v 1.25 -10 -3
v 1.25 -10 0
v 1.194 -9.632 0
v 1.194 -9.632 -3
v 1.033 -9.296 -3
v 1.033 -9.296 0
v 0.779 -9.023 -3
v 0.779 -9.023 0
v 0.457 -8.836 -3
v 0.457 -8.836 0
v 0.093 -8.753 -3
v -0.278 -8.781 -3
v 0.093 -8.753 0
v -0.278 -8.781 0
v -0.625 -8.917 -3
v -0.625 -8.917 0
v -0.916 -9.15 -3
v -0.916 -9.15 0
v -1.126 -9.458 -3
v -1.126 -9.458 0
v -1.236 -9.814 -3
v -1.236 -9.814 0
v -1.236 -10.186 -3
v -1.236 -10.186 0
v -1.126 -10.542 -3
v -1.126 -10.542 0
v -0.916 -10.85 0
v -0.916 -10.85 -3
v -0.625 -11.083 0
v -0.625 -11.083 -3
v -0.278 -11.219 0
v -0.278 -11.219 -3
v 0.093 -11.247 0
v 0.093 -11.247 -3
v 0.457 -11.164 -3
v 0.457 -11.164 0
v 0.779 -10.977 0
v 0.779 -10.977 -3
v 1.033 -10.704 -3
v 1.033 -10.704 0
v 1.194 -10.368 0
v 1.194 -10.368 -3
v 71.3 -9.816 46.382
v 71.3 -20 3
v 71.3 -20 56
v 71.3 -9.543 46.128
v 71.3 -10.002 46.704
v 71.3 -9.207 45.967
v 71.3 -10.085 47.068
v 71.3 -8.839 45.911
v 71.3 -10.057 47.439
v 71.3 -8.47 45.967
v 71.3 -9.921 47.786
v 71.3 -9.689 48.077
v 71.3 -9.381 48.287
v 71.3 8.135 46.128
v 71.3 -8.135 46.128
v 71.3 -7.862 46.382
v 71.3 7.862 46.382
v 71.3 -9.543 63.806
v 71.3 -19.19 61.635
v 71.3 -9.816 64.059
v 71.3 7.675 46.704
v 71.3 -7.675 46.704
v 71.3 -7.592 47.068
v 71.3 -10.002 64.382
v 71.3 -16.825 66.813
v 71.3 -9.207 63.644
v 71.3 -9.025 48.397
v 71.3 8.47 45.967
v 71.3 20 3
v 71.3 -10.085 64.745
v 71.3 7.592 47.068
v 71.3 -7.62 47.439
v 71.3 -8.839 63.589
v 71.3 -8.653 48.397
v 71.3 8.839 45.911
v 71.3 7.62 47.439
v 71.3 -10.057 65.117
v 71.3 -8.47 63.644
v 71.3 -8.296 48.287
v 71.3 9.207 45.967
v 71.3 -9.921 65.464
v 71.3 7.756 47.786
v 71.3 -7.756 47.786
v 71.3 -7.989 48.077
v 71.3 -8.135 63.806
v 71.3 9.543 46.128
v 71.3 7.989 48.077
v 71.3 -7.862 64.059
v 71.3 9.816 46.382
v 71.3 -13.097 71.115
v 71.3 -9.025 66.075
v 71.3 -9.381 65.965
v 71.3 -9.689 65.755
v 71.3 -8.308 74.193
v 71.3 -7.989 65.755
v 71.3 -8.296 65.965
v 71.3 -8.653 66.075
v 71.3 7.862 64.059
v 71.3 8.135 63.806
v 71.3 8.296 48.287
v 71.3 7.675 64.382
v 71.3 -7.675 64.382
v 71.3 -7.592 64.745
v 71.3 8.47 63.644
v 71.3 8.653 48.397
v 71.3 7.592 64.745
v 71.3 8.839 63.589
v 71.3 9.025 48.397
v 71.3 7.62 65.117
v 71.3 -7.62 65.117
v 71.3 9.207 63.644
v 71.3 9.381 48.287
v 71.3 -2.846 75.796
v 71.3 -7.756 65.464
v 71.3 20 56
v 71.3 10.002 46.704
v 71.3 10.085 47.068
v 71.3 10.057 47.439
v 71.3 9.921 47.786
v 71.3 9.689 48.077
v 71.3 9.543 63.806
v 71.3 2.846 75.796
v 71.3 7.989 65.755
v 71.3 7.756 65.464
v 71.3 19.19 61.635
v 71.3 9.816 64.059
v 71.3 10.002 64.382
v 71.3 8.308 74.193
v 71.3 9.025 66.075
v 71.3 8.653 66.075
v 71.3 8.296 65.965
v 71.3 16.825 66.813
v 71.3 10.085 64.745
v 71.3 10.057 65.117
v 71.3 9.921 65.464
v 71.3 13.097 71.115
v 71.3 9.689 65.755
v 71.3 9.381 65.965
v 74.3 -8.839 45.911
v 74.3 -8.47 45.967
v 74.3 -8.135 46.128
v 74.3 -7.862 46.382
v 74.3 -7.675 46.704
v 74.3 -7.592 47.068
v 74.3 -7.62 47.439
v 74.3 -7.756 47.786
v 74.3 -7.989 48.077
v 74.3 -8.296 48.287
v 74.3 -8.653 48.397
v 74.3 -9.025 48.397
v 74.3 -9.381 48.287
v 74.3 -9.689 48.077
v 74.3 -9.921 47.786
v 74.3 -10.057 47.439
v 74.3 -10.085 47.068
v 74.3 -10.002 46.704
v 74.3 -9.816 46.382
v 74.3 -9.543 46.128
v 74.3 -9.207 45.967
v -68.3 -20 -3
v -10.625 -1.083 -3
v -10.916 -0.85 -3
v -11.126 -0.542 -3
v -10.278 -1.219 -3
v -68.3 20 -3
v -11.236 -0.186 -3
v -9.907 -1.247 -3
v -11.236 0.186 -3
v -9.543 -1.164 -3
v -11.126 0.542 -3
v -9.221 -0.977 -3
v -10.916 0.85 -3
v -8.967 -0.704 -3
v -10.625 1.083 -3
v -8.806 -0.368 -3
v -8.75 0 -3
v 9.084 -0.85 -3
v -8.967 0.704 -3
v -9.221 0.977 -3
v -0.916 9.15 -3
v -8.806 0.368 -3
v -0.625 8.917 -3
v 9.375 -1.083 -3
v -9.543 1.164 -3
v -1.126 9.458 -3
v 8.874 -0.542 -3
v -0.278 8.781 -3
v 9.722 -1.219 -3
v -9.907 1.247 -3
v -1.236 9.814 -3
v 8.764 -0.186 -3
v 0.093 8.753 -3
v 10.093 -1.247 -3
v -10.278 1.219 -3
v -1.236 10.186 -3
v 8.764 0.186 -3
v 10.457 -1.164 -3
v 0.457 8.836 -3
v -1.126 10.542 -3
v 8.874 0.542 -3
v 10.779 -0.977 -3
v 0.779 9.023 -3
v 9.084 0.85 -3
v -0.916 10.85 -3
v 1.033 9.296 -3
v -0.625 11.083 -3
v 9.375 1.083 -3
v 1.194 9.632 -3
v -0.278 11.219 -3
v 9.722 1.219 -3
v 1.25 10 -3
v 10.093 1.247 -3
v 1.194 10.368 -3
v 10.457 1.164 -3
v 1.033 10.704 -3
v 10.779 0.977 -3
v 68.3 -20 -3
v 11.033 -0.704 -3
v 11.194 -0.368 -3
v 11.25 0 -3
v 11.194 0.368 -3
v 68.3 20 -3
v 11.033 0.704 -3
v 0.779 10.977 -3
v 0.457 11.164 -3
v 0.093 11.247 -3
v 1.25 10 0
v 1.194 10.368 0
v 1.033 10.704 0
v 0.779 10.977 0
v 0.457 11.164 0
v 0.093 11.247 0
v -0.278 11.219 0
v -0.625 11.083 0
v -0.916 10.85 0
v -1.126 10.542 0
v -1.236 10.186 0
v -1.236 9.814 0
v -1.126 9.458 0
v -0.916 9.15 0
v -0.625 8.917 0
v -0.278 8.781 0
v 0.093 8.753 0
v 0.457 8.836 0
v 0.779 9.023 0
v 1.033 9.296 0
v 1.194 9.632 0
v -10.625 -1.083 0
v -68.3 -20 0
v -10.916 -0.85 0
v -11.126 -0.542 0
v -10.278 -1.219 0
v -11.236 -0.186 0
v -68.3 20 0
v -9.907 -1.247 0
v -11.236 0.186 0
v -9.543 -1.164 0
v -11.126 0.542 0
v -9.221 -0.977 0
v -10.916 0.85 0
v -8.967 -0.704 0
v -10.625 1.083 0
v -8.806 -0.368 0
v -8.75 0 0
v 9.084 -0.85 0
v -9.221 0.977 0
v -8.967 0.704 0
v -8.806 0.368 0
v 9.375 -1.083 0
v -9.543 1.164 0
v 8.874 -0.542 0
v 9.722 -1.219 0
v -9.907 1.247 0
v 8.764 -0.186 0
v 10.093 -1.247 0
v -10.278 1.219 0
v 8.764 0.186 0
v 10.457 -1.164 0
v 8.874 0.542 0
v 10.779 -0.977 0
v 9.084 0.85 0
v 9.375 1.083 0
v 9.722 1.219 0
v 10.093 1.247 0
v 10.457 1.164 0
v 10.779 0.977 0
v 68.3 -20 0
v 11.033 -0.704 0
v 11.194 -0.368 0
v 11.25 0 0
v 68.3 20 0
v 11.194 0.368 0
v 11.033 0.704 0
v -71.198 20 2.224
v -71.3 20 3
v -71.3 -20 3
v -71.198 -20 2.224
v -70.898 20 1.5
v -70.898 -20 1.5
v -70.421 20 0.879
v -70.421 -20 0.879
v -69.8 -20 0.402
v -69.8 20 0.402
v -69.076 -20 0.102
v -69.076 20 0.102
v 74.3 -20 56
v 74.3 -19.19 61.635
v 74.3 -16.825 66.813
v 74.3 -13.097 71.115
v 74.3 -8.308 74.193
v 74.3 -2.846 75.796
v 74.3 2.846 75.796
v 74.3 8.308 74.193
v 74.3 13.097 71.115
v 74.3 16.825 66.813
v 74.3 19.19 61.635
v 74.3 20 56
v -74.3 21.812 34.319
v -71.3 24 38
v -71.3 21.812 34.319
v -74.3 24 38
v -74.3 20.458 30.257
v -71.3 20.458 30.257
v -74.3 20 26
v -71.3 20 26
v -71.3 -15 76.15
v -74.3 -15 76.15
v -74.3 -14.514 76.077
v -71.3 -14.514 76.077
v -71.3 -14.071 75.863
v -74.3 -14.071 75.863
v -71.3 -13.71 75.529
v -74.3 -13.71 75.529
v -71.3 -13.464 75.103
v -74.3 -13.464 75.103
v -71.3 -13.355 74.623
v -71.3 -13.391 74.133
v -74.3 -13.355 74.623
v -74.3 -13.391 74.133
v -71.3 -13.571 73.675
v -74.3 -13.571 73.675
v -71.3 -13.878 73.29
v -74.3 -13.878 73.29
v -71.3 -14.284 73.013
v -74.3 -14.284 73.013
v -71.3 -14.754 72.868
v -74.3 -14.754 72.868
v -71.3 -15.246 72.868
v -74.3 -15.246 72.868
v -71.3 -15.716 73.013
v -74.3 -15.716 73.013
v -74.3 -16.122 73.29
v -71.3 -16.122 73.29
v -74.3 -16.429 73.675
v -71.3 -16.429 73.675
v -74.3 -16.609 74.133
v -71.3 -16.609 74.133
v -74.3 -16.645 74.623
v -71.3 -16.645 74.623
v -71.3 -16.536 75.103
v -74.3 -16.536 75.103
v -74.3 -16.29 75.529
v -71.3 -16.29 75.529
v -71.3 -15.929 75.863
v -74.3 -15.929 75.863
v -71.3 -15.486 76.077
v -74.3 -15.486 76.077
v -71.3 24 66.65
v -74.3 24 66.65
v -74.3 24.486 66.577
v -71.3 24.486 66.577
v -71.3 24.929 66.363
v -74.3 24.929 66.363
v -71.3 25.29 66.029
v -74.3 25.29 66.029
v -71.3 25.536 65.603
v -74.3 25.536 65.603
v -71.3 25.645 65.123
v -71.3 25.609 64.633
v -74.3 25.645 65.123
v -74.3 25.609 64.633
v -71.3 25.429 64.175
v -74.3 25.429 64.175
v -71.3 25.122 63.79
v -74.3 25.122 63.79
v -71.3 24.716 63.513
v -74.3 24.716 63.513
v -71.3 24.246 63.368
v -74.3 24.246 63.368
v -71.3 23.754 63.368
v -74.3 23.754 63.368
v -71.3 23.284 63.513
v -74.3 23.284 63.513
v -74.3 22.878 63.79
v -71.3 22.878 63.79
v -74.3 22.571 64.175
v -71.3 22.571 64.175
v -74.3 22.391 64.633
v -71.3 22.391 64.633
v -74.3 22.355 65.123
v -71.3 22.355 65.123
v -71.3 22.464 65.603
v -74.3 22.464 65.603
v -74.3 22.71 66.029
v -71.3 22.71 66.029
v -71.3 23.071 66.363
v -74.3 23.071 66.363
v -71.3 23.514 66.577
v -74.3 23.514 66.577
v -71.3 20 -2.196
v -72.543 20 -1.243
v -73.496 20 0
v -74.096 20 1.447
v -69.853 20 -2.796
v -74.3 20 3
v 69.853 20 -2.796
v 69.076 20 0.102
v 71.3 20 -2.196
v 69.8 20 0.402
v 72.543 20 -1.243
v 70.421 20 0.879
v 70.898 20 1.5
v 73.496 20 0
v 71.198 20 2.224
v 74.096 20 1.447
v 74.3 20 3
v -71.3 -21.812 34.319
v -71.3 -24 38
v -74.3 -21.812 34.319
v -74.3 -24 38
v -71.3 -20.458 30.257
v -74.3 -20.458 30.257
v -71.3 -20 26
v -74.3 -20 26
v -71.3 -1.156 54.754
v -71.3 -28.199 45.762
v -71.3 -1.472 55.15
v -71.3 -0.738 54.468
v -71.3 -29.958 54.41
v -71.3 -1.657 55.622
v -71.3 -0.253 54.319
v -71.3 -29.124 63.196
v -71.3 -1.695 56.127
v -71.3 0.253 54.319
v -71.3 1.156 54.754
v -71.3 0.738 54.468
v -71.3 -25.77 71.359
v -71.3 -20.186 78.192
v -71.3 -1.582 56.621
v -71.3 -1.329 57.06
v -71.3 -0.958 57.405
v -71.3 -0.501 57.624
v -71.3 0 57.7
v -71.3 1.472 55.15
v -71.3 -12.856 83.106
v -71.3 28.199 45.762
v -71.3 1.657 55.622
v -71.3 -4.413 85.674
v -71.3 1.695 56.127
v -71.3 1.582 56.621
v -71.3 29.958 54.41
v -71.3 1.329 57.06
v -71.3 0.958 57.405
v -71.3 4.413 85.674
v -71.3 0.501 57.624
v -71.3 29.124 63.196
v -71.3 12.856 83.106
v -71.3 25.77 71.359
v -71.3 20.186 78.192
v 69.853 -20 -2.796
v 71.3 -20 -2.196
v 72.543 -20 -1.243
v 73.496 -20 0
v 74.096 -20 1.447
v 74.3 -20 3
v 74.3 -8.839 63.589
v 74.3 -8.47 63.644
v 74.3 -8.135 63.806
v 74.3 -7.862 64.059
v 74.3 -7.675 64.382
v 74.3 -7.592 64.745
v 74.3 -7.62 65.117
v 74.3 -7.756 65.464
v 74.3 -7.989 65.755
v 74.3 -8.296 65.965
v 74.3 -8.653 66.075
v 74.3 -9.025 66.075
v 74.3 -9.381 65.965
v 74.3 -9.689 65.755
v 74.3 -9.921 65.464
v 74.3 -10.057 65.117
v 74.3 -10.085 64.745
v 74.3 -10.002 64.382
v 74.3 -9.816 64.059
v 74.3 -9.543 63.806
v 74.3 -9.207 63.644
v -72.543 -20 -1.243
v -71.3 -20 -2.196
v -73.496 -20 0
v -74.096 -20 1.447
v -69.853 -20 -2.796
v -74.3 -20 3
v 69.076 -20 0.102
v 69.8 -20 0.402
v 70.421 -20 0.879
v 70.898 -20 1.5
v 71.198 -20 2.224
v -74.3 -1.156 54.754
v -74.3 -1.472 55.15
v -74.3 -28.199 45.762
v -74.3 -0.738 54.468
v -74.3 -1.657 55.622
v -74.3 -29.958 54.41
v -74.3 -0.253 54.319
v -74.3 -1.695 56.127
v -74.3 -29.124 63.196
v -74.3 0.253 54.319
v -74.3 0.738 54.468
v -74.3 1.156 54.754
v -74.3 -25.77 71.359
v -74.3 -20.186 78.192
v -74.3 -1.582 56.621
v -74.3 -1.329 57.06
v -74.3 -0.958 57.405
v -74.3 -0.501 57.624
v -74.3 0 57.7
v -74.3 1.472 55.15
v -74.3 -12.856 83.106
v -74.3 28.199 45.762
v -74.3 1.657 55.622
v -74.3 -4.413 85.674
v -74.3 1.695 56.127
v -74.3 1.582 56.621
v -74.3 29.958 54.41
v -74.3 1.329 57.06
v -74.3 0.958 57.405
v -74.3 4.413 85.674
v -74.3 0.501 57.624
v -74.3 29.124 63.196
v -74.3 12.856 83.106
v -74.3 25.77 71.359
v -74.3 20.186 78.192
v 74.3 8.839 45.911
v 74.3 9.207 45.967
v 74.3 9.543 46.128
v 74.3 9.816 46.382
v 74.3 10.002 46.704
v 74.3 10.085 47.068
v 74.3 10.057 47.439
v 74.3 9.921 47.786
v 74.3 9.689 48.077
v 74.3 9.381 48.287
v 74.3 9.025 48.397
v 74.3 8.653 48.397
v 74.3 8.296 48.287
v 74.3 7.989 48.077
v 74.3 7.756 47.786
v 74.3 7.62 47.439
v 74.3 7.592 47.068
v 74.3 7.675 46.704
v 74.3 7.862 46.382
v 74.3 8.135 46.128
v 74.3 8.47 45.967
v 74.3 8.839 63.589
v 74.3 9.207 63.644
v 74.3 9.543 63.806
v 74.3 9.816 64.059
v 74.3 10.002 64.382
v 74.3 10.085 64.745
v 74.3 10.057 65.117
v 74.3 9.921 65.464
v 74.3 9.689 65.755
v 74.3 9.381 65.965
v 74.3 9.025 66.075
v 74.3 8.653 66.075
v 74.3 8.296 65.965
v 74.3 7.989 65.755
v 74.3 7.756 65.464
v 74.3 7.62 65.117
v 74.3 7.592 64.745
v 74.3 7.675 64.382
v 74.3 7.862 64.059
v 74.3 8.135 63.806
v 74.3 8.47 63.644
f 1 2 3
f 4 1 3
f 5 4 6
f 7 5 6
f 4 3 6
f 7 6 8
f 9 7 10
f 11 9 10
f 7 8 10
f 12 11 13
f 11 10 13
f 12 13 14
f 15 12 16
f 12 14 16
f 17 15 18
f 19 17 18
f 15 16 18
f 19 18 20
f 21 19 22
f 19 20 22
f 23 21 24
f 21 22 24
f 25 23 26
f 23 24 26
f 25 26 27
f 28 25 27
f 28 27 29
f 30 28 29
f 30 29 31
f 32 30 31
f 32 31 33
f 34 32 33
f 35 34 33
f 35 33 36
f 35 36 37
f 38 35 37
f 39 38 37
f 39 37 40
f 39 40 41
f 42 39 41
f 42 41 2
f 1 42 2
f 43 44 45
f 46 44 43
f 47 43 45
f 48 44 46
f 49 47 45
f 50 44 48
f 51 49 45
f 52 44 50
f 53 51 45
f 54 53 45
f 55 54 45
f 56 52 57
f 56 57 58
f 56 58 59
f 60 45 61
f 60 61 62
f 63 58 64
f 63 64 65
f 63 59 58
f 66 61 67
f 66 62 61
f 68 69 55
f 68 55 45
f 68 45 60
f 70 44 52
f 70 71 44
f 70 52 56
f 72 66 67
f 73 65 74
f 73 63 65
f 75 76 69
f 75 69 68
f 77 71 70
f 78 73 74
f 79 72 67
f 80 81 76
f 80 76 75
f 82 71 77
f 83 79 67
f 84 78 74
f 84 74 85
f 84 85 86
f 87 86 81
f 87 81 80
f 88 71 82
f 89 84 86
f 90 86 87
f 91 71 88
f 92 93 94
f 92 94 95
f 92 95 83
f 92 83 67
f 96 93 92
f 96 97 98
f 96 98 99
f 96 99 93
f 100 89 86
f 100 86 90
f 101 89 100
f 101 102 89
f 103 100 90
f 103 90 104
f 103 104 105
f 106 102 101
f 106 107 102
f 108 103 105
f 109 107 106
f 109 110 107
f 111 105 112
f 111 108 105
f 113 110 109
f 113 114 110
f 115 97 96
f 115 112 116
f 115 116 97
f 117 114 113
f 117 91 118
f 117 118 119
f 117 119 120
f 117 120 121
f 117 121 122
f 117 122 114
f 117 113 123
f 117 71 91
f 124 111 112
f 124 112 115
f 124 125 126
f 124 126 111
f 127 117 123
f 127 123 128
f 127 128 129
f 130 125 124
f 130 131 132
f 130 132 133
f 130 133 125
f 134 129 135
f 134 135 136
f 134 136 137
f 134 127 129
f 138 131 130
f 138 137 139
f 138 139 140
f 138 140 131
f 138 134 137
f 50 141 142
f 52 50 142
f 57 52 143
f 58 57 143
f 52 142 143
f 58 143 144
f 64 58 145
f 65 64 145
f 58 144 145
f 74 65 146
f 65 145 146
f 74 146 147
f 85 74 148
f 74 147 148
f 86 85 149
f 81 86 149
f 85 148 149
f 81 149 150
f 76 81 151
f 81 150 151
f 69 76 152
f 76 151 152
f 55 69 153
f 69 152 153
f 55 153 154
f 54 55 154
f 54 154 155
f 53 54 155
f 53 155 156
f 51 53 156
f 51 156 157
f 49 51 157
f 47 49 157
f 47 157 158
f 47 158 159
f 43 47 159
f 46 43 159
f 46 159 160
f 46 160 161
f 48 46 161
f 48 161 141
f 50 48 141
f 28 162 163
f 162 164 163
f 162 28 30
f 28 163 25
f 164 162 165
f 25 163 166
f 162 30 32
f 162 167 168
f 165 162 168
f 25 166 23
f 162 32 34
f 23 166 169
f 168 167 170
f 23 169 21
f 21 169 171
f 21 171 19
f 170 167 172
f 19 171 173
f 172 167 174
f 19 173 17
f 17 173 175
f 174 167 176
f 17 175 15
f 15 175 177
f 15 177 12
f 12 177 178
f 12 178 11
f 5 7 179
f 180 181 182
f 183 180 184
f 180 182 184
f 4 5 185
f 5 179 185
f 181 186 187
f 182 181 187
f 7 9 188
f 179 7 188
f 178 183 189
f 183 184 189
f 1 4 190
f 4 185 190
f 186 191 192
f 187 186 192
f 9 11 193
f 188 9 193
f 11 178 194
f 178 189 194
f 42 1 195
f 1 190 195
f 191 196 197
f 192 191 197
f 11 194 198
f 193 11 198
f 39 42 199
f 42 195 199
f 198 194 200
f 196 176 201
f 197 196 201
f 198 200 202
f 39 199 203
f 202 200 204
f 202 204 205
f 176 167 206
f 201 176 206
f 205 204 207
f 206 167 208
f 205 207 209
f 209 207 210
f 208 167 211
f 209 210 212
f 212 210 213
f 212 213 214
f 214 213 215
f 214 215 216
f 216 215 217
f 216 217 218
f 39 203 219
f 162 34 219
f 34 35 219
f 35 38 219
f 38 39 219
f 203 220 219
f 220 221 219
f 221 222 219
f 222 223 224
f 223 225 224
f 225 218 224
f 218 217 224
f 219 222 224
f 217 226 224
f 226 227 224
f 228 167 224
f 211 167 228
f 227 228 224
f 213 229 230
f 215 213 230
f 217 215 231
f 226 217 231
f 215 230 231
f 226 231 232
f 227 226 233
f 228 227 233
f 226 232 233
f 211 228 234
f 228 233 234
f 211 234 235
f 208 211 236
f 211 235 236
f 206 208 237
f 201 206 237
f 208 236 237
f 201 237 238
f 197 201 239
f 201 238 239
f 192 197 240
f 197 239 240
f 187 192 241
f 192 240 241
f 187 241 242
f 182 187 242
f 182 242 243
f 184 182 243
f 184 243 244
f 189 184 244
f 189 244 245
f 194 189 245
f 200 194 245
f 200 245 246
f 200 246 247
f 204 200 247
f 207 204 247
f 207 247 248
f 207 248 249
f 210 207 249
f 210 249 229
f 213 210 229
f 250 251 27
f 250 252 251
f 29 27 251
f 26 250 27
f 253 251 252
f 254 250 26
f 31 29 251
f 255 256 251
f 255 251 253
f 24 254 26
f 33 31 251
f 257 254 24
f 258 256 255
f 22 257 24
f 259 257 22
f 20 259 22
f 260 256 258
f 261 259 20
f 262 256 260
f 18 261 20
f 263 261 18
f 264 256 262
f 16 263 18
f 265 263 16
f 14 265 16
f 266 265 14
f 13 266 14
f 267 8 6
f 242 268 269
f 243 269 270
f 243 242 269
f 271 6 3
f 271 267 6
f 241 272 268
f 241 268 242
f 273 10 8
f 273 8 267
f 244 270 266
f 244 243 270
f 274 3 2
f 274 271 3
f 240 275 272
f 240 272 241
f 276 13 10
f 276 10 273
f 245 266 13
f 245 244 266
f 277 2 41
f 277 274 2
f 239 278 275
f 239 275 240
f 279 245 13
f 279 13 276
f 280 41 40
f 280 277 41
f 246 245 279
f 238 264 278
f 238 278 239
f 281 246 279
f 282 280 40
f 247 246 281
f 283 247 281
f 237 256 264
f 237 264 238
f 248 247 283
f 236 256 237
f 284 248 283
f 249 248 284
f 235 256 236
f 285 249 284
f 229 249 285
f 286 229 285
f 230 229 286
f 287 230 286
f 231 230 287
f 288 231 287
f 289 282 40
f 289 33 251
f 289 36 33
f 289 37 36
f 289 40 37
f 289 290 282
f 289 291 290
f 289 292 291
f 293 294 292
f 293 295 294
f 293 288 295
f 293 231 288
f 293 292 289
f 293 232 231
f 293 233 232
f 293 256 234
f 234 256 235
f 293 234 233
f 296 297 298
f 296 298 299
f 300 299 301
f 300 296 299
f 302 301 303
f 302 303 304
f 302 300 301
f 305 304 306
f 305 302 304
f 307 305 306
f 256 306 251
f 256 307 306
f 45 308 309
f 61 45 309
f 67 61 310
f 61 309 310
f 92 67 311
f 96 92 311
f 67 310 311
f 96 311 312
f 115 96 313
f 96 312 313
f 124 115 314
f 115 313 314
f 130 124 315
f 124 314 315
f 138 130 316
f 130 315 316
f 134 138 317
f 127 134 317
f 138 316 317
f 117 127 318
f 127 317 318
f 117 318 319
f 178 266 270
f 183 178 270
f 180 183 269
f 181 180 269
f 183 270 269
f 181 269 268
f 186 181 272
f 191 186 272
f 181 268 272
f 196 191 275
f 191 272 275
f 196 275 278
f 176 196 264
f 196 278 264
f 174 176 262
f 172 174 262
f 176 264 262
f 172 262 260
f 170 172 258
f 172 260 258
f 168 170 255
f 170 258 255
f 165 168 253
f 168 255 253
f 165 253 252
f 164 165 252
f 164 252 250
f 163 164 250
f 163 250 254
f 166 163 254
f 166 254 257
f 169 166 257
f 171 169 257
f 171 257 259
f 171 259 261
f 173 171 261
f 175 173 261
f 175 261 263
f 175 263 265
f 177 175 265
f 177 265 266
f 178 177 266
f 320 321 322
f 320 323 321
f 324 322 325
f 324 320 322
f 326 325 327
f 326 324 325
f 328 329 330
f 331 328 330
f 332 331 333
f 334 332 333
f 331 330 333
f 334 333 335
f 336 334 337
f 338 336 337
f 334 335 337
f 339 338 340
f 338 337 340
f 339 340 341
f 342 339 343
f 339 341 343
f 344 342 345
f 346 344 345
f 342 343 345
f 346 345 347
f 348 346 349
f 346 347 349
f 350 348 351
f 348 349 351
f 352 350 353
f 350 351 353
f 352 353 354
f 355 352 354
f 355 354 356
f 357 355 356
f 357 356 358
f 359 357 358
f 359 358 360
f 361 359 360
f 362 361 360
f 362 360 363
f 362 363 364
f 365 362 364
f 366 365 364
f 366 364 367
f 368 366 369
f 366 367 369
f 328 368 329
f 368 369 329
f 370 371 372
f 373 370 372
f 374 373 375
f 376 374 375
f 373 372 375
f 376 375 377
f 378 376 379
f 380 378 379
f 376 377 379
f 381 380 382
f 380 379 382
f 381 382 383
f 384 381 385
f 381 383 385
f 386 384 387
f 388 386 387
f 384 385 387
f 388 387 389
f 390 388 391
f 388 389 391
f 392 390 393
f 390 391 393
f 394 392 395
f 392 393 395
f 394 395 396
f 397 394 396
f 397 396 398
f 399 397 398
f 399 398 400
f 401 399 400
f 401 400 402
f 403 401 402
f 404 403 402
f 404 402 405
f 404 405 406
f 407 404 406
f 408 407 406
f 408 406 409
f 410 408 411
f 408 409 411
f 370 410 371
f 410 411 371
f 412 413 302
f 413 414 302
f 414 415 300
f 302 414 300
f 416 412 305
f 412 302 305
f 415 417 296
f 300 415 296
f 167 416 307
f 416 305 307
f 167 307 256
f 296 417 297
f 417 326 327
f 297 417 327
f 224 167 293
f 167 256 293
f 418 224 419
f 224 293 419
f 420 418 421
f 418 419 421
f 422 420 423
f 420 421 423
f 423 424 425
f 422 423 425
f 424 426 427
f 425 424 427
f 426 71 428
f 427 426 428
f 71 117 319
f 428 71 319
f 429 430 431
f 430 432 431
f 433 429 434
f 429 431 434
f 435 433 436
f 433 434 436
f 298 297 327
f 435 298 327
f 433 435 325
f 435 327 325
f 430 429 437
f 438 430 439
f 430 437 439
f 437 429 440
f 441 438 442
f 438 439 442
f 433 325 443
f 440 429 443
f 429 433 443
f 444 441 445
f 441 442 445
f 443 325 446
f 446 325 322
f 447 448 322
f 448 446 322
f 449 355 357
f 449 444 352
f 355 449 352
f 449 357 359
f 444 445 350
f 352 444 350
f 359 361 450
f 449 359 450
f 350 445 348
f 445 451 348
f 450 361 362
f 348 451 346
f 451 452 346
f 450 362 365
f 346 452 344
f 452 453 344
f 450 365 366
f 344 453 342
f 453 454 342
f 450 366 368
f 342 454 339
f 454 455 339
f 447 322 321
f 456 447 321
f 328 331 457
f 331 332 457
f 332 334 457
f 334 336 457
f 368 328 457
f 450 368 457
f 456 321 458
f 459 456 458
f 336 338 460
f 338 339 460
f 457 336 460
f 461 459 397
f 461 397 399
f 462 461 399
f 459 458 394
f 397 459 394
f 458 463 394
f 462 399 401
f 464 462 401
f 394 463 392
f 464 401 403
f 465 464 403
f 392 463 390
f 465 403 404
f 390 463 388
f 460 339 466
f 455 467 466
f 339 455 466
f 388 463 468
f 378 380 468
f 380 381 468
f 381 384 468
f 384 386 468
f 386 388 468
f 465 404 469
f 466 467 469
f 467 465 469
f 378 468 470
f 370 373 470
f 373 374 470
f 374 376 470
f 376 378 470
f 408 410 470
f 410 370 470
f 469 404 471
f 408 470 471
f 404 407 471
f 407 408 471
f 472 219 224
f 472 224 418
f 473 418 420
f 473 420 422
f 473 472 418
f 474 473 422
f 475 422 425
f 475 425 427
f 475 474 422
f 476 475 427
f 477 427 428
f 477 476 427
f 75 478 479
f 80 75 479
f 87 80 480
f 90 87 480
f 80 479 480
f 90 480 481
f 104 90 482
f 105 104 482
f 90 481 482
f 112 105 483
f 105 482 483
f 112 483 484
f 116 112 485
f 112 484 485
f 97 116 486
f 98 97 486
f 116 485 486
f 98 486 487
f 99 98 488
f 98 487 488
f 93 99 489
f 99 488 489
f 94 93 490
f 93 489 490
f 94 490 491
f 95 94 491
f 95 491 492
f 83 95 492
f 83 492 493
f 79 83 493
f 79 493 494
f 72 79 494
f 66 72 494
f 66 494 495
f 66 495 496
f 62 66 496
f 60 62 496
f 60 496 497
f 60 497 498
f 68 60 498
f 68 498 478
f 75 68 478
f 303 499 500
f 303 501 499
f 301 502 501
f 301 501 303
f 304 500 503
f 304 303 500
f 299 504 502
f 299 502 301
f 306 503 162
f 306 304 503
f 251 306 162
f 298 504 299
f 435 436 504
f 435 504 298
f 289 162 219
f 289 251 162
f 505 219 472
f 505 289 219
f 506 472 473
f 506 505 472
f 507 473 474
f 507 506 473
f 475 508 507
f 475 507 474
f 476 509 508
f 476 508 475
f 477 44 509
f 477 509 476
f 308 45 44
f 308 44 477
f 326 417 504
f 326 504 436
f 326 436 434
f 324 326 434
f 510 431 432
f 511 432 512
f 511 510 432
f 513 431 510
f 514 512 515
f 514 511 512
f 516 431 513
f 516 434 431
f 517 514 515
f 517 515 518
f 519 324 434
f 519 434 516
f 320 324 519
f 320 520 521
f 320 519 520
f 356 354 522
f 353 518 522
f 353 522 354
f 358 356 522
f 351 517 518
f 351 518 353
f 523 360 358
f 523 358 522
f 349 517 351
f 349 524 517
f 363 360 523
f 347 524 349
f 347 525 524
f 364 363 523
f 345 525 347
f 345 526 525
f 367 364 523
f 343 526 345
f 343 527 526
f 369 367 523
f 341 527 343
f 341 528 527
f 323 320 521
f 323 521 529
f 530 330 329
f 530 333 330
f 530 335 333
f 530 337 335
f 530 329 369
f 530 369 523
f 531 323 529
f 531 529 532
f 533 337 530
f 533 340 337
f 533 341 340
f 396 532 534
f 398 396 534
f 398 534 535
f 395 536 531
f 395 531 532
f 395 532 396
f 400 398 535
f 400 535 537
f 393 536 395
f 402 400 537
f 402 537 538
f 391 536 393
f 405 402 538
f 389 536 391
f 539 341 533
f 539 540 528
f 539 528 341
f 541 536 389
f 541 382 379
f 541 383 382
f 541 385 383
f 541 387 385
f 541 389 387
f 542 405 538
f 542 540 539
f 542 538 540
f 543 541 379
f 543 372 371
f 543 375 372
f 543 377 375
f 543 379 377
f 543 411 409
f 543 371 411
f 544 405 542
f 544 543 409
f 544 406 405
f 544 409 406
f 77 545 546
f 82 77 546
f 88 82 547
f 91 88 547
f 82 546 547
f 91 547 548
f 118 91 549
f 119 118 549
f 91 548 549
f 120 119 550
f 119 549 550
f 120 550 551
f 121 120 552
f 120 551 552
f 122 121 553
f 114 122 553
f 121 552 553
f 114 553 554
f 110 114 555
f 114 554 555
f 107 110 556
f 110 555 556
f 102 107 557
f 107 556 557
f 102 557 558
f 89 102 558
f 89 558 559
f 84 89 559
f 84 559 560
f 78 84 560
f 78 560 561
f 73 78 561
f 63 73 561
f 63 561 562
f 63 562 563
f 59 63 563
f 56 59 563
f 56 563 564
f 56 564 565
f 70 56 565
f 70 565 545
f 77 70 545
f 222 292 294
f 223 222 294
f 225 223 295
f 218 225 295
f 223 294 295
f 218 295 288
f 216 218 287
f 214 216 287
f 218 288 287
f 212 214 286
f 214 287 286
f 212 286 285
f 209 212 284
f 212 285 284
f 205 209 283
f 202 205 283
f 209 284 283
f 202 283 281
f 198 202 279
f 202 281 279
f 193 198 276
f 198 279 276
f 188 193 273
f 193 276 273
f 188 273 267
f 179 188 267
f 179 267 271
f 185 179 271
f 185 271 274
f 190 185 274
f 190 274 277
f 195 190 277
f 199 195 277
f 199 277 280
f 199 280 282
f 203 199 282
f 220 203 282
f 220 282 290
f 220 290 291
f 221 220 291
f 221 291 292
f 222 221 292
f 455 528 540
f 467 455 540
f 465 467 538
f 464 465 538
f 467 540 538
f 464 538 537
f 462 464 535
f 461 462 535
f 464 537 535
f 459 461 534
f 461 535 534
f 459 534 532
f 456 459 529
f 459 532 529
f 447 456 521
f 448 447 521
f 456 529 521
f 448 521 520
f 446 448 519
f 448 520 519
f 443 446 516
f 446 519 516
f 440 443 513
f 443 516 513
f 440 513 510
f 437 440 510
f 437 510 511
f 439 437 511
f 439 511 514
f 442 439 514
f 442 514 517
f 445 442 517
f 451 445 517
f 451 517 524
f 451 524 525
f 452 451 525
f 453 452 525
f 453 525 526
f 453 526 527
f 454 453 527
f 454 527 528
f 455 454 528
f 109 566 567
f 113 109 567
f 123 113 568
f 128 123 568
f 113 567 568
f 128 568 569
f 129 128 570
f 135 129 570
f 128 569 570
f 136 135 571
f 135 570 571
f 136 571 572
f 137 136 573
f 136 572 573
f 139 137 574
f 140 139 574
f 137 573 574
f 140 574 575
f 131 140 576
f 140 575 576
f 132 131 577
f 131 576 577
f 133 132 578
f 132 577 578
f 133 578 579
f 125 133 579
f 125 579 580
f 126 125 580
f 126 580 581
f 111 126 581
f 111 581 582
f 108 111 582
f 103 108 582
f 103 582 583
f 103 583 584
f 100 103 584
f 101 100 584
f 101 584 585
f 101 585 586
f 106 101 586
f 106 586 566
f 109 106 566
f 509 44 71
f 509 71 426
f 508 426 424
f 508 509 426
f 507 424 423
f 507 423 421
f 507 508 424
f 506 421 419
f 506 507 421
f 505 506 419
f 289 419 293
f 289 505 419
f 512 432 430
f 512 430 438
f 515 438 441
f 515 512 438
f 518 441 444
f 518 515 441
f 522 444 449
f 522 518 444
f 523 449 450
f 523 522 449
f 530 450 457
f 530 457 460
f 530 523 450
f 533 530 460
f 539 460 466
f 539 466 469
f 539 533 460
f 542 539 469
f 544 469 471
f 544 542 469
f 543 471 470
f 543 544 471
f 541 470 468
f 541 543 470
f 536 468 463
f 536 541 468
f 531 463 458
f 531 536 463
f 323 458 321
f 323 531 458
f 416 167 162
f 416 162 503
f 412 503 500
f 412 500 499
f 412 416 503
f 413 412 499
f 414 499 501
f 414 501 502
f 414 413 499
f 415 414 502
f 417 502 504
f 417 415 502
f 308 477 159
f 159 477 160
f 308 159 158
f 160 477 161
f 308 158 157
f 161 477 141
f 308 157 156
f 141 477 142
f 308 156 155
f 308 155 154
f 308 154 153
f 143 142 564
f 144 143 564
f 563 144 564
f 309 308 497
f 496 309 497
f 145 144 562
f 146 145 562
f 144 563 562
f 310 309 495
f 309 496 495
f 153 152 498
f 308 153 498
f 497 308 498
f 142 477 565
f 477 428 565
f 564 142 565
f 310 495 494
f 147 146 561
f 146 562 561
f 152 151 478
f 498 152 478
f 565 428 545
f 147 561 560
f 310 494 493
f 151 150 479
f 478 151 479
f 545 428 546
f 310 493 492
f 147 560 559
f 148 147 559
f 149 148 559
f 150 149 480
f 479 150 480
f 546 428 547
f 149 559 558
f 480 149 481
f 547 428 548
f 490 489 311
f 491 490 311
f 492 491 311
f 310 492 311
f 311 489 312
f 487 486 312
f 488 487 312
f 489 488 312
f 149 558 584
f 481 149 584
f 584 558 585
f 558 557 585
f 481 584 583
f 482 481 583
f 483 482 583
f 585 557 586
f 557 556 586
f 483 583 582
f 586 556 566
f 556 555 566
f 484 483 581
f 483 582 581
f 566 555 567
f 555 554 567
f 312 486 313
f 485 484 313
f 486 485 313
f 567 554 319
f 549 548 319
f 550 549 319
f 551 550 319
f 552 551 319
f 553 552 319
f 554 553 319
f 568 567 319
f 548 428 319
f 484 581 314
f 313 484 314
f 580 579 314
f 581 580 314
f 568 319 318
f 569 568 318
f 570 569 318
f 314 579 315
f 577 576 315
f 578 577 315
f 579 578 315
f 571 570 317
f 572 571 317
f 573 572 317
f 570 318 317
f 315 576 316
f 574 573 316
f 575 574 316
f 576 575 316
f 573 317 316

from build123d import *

# Parameters (mm, degrees)
ESQUISSE1_W                           = 142.6
ESQUISSE1_H                           = 40
T_LE_DE_BASE_PLI_E1_DEPTH             = 3
T_LE_PLI_E_SUR_AR_TE1_STRIP_W         = 18
T_LE_PLI_E_SUR_AR_TE1_STRIP_H         = 3
T_LE_PLI_E_SUR_AR_TE1_STRIP_CUT_DEPTH = 40
T_LE_PLI_E_SUR_AR_TE1_DEPTH           = 40
T_LE_PLI_E_SUR_AR_TE2_STRIP_W         = 18
T_LE_PLI_E_SUR_AR_TE2_STRIP_H         = 3
T_LE_PLI_E_SUR_AR_TE2_STRIP_CUT_DEPTH = 40
T_LE_PLI_E_SUR_AR_TE2_DEPTH           = 40
ENL_V_MAT_EXTRU_1_REACH               = 97.166
ESQUISSE14_R                          = 1.25
PATTE1_DEPTH                          = 3
ENL_V_MAT_EXTRU_2_REACH               = 170.101
ESQUISSE19_R                          = 1.25
PATTE2_START                          = -3
PATTE2_DEPTH                          = 3
ENL_V_MAT_EXTRU_3_REACH               = 170.101
ESQUISSE24_R                          = 1.7
ESQUISSE25_R                          = 30
ESQUISSE25_R_2                        = 1.65
ESQUISSE25_R_3                        = 1.7
BOSS_EXTRU_1_DEPTH                    = 3
CONG_1_R                              = 20


# Sheet-metal steps are written as plain solids
with BuildPart() as part:
    # Esquisse1 → Tôle de base pliée1 (new body)
    with BuildSketch(Plane.XY):
        Rectangle(ESQUISSE1_W, ESQUISSE1_H)
    extrude(amount=-T_LE_DE_BASE_PLI_E1_DEPTH)

    # Tôle pliée sur arête1 strip (across the edge) → Tôle pliée sur arête1 strip cut (cut)
    with BuildSketch(Plane(origin=(-71.3, 20, 0), x_dir=(1, 0, 0), z_dir=(0, -1, 0))):
        with Locations((-6, -1.5)):
            Rectangle(T_LE_PLI_E_SUR_AR_TE1_STRIP_W, T_LE_PLI_E_SUR_AR_TE1_STRIP_H)
    extrude(amount=T_LE_PLI_E_SUR_AR_TE1_STRIP_CUT_DEPTH, mode=Mode.SUBTRACT)

    # Tôle pliée sur arête1 section (across the edge) → Tôle pliée sur arête1 (add)
    with BuildSketch(Plane(origin=(-71.3, 20, 0), x_dir=(1, 0, 0), z_dir=(0, -1, 0))):
        with BuildLine():
            Line((-3, 3), (-3, 56))
            Line((-3, 56), (0, 56))
            Line((0, 56), (0, 3))
            ThreePointArc((0, 3), (0.878679656, 0.878679656), (3, 0))
            Line((3, 0), (3, -3))
            ThreePointArc((3, -3), (-1.242640687, -1.242640687), (-3, 3))
        make_face()
    extrude(amount=T_LE_PLI_E_SUR_AR_TE1_DEPTH)

    # Tôle pliée sur arête2 strip (across the edge) → Tôle pliée sur arête2 strip cut (cut)
    with BuildSketch(Plane(origin=(71.3, -20, 0), x_dir=(-1, 0, 0), z_dir=(0, 1, 0))):
        with Locations((-6, -1.5)):
            Rectangle(T_LE_PLI_E_SUR_AR_TE2_STRIP_W, T_LE_PLI_E_SUR_AR_TE2_STRIP_H)
    extrude(amount=T_LE_PLI_E_SUR_AR_TE2_STRIP_CUT_DEPTH, mode=Mode.SUBTRACT)

    # Tôle pliée sur arête2 section (across the edge) → Tôle pliée sur arête2 (add)
    with BuildSketch(Plane(origin=(71.3, -20, 0), x_dir=(-1, 0, 0), z_dir=(0, 1, 0))):
        with BuildLine():
            Line((-3, 3), (-3, 56))
            Line((-3, 56), (0, 56))
            Line((0, 56), (0, 3))
            ThreePointArc((0, 3), (0.878679656, 0.878679656), (3, 0))
            Line((3, 0), (3, -3))
            ThreePointArc((3, -3), (-1.242640687, -1.242640687), (-3, 3))
        make_face()
    extrude(amount=T_LE_PLI_E_SUR_AR_TE2_DEPTH)

    # Esquisse14 → Enlèv. mat.-Extru.1 (cut, up to next)
    with BuildSketch(Plane.XY, mode=Mode.PRIVATE) as enl_v_mat_extru_1_sk1:
        with Locations((0, 10)):
            Circle(ESQUISSE14_R)
    enl_v_mat_extru_1_tool1 = extrude(enl_v_mat_extru_1_sk1.sketch, amount=-ENL_V_MAT_EXTRU_1_REACH, mode=Mode.PRIVATE) & part.part
    # Esquisse14 → Enlèv. mat.-Extru.1 (cut, up to next)
    with BuildSketch(Plane.XY, mode=Mode.PRIVATE) as enl_v_mat_extru_1_sk2:
        with Locations((10, 0)):
            Circle(ESQUISSE14_R)
    enl_v_mat_extru_1_tool2 = extrude(enl_v_mat_extru_1_sk2.sketch, amount=-ENL_V_MAT_EXTRU_1_REACH, mode=Mode.PRIVATE) & part.part
    # Esquisse14 → Enlèv. mat.-Extru.1 (cut, up to next)
    with BuildSketch(Plane.XY, mode=Mode.PRIVATE) as enl_v_mat_extru_1_sk3:
        with Locations((0, -10)):
            Circle(ESQUISSE14_R)
    enl_v_mat_extru_1_tool3 = extrude(enl_v_mat_extru_1_sk3.sketch, amount=-ENL_V_MAT_EXTRU_1_REACH, mode=Mode.PRIVATE) & part.part
    # Esquisse14 → Enlèv. mat.-Extru.1 (cut, up to next)
    with BuildSketch(Plane.XY, mode=Mode.PRIVATE) as enl_v_mat_extru_1_sk4:
        with Locations((-10, 0)):
            Circle(ESQUISSE14_R)
    enl_v_mat_extru_1_tool4 = extrude(enl_v_mat_extru_1_sk4.sketch, amount=-ENL_V_MAT_EXTRU_1_REACH, mode=Mode.PRIVATE) & part.part
    add(enl_v_mat_extru_1_tool1.solids().sort_by_distance((0, 10, 0))[0], mode=Mode.SUBTRACT)
    add(enl_v_mat_extru_1_tool2.solids().sort_by_distance((10, 0, 0))[0], mode=Mode.SUBTRACT)
    add(enl_v_mat_extru_1_tool3.solids().sort_by_distance((0, -10, 0))[0], mode=Mode.SUBTRACT)
    add(enl_v_mat_extru_1_tool4.solids().sort_by_distance((-10, 0, 0))[0], mode=Mode.SUBTRACT)

    # Esquisse16 → Patte1 (add)
    with BuildSketch(Plane(origin=(74.3, 0, 0), x_dir=(0, 0, -1), z_dir=(1, 0, 0))):
        with BuildLine():
            Line((-56, 20), (-56, -20))
            ThreePointArc((-56, -20), (-76, 0), (-56, 20))
        make_face()
    extrude(amount=-PATTE1_DEPTH)

    # Esquisse19 → Enlèv. mat.-Extru.2 (cut, up to next)
    with BuildSketch(Plane(origin=(74.3, 0, 0), x_dir=(0, 0, -1), z_dir=(1, 0, 0)), mode=Mode.PRIVATE) as enl_v_mat_extru_2_sk1:
        with Locations((-64.838834765, 8.838834765)):
            Circle(ESQUISSE19_R)
    enl_v_mat_extru_2_tool1 = extrude(enl_v_mat_extru_2_sk1.sketch, amount=-ENL_V_MAT_EXTRU_2_REACH, mode=Mode.PRIVATE) & part.part
    # Esquisse19 → Enlèv. mat.-Extru.2 (cut, up to next)
    with BuildSketch(Plane(origin=(74.3, 0, 0), x_dir=(0, 0, -1), z_dir=(1, 0, 0)), mode=Mode.PRIVATE) as enl_v_mat_extru_2_sk2:
        with Locations((-47.161165235, 8.838834765)):
            Circle(ESQUISSE19_R)
    enl_v_mat_extru_2_tool2 = extrude(enl_v_mat_extru_2_sk2.sketch, amount=-ENL_V_MAT_EXTRU_2_REACH, mode=Mode.PRIVATE) & part.part
    # Esquisse19 → Enlèv. mat.-Extru.2 (cut, up to next)
    with BuildSketch(Plane(origin=(74.3, 0, 0), x_dir=(0, 0, -1), z_dir=(1, 0, 0)), mode=Mode.PRIVATE) as enl_v_mat_extru_2_sk3:
        with Locations((-47.161165235, -8.838834765)):
            Circle(ESQUISSE19_R)
    enl_v_mat_extru_2_tool3 = extrude(enl_v_mat_extru_2_sk3.sketch, amount=-ENL_V_MAT_EXTRU_2_REACH, mode=Mode.PRIVATE) & part.part
    # Esquisse19 → Enlèv. mat.-Extru.2 (cut, up to next)
    with BuildSketch(Plane(origin=(74.3, 0, 0), x_dir=(0, 0, -1), z_dir=(1, 0, 0)), mode=Mode.PRIVATE) as enl_v_mat_extru_2_sk4:
        with Locations((-64.838834765, -8.838834765)):
            Circle(ESQUISSE19_R)
    enl_v_mat_extru_2_tool4 = extrude(enl_v_mat_extru_2_sk4.sketch, amount=-ENL_V_MAT_EXTRU_2_REACH, mode=Mode.PRIVATE) & part.part
    add(enl_v_mat_extru_2_tool1.solids().sort_by_distance((74.3, 8.838835, 64.838835))[0], mode=Mode.SUBTRACT)
    add(enl_v_mat_extru_2_tool2.solids().sort_by_distance((74.3, 8.838835, 47.161165))[0], mode=Mode.SUBTRACT)
    add(enl_v_mat_extru_2_tool3.solids().sort_by_distance((74.3, -8.838835, 47.161165))[0], mode=Mode.SUBTRACT)
    add(enl_v_mat_extru_2_tool4.solids().sort_by_distance((74.3, -8.838835, 64.838835))[0], mode=Mode.SUBTRACT)

    # Esquisse20 → Patte2 (add)
    with BuildSketch(Plane.ZY.offset(74.3).offset(PATTE2_START)):
        with BuildLine():
            Line((56, 20), (56, -20))
            ThreePointArc((56, -20), (76, 0), (56, 20))
        make_face()
    extrude(amount=PATTE2_DEPTH)

    # Esquisse24 → Enlèv. mat.-Extru.3 (cut, up to next)
    with BuildSketch(Plane.ZY.offset(74.3), mode=Mode.PRIVATE) as enl_v_mat_extru_3_sk1:
        with Locations((56, 0)):
            Circle(ESQUISSE24_R)
    enl_v_mat_extru_3_tool1 = extrude(enl_v_mat_extru_3_sk1.sketch, amount=-ENL_V_MAT_EXTRU_3_REACH, mode=Mode.PRIVATE) & part.part
    add(enl_v_mat_extru_3_tool1.solids().sort_by_distance((-74.3, 0, 56))[0], mode=Mode.SUBTRACT)

    # Esquisse25 → Boss.-Extru.1 (add)
    with BuildSketch(Plane.ZY.offset(74.3)):
        with Locations((56, 0)):
            Circle(ESQUISSE25_R)
        with Locations((65, 24)):
            Circle(ESQUISSE25_R_2, mode=Mode.SUBTRACT)
        with Locations((74.5, -15)):
            Circle(ESQUISSE25_R_2, mode=Mode.SUBTRACT)
        with Locations((56, 0)):
            Circle(ESQUISSE25_R_3, mode=Mode.SUBTRACT)
    extrude(amount=-BOSS_EXTRU_1_DEPTH)

    # Congé1
    cong_1_edges = [part.edges().sort_by_distance(p)[0] for p in [
        (-72.8, 20, 33.639320225),
        (-72.8, -20, 33.639320225),
    ]]
    fillet(cong_1_edges, radius=CONG_1_R)


solid = part.part
